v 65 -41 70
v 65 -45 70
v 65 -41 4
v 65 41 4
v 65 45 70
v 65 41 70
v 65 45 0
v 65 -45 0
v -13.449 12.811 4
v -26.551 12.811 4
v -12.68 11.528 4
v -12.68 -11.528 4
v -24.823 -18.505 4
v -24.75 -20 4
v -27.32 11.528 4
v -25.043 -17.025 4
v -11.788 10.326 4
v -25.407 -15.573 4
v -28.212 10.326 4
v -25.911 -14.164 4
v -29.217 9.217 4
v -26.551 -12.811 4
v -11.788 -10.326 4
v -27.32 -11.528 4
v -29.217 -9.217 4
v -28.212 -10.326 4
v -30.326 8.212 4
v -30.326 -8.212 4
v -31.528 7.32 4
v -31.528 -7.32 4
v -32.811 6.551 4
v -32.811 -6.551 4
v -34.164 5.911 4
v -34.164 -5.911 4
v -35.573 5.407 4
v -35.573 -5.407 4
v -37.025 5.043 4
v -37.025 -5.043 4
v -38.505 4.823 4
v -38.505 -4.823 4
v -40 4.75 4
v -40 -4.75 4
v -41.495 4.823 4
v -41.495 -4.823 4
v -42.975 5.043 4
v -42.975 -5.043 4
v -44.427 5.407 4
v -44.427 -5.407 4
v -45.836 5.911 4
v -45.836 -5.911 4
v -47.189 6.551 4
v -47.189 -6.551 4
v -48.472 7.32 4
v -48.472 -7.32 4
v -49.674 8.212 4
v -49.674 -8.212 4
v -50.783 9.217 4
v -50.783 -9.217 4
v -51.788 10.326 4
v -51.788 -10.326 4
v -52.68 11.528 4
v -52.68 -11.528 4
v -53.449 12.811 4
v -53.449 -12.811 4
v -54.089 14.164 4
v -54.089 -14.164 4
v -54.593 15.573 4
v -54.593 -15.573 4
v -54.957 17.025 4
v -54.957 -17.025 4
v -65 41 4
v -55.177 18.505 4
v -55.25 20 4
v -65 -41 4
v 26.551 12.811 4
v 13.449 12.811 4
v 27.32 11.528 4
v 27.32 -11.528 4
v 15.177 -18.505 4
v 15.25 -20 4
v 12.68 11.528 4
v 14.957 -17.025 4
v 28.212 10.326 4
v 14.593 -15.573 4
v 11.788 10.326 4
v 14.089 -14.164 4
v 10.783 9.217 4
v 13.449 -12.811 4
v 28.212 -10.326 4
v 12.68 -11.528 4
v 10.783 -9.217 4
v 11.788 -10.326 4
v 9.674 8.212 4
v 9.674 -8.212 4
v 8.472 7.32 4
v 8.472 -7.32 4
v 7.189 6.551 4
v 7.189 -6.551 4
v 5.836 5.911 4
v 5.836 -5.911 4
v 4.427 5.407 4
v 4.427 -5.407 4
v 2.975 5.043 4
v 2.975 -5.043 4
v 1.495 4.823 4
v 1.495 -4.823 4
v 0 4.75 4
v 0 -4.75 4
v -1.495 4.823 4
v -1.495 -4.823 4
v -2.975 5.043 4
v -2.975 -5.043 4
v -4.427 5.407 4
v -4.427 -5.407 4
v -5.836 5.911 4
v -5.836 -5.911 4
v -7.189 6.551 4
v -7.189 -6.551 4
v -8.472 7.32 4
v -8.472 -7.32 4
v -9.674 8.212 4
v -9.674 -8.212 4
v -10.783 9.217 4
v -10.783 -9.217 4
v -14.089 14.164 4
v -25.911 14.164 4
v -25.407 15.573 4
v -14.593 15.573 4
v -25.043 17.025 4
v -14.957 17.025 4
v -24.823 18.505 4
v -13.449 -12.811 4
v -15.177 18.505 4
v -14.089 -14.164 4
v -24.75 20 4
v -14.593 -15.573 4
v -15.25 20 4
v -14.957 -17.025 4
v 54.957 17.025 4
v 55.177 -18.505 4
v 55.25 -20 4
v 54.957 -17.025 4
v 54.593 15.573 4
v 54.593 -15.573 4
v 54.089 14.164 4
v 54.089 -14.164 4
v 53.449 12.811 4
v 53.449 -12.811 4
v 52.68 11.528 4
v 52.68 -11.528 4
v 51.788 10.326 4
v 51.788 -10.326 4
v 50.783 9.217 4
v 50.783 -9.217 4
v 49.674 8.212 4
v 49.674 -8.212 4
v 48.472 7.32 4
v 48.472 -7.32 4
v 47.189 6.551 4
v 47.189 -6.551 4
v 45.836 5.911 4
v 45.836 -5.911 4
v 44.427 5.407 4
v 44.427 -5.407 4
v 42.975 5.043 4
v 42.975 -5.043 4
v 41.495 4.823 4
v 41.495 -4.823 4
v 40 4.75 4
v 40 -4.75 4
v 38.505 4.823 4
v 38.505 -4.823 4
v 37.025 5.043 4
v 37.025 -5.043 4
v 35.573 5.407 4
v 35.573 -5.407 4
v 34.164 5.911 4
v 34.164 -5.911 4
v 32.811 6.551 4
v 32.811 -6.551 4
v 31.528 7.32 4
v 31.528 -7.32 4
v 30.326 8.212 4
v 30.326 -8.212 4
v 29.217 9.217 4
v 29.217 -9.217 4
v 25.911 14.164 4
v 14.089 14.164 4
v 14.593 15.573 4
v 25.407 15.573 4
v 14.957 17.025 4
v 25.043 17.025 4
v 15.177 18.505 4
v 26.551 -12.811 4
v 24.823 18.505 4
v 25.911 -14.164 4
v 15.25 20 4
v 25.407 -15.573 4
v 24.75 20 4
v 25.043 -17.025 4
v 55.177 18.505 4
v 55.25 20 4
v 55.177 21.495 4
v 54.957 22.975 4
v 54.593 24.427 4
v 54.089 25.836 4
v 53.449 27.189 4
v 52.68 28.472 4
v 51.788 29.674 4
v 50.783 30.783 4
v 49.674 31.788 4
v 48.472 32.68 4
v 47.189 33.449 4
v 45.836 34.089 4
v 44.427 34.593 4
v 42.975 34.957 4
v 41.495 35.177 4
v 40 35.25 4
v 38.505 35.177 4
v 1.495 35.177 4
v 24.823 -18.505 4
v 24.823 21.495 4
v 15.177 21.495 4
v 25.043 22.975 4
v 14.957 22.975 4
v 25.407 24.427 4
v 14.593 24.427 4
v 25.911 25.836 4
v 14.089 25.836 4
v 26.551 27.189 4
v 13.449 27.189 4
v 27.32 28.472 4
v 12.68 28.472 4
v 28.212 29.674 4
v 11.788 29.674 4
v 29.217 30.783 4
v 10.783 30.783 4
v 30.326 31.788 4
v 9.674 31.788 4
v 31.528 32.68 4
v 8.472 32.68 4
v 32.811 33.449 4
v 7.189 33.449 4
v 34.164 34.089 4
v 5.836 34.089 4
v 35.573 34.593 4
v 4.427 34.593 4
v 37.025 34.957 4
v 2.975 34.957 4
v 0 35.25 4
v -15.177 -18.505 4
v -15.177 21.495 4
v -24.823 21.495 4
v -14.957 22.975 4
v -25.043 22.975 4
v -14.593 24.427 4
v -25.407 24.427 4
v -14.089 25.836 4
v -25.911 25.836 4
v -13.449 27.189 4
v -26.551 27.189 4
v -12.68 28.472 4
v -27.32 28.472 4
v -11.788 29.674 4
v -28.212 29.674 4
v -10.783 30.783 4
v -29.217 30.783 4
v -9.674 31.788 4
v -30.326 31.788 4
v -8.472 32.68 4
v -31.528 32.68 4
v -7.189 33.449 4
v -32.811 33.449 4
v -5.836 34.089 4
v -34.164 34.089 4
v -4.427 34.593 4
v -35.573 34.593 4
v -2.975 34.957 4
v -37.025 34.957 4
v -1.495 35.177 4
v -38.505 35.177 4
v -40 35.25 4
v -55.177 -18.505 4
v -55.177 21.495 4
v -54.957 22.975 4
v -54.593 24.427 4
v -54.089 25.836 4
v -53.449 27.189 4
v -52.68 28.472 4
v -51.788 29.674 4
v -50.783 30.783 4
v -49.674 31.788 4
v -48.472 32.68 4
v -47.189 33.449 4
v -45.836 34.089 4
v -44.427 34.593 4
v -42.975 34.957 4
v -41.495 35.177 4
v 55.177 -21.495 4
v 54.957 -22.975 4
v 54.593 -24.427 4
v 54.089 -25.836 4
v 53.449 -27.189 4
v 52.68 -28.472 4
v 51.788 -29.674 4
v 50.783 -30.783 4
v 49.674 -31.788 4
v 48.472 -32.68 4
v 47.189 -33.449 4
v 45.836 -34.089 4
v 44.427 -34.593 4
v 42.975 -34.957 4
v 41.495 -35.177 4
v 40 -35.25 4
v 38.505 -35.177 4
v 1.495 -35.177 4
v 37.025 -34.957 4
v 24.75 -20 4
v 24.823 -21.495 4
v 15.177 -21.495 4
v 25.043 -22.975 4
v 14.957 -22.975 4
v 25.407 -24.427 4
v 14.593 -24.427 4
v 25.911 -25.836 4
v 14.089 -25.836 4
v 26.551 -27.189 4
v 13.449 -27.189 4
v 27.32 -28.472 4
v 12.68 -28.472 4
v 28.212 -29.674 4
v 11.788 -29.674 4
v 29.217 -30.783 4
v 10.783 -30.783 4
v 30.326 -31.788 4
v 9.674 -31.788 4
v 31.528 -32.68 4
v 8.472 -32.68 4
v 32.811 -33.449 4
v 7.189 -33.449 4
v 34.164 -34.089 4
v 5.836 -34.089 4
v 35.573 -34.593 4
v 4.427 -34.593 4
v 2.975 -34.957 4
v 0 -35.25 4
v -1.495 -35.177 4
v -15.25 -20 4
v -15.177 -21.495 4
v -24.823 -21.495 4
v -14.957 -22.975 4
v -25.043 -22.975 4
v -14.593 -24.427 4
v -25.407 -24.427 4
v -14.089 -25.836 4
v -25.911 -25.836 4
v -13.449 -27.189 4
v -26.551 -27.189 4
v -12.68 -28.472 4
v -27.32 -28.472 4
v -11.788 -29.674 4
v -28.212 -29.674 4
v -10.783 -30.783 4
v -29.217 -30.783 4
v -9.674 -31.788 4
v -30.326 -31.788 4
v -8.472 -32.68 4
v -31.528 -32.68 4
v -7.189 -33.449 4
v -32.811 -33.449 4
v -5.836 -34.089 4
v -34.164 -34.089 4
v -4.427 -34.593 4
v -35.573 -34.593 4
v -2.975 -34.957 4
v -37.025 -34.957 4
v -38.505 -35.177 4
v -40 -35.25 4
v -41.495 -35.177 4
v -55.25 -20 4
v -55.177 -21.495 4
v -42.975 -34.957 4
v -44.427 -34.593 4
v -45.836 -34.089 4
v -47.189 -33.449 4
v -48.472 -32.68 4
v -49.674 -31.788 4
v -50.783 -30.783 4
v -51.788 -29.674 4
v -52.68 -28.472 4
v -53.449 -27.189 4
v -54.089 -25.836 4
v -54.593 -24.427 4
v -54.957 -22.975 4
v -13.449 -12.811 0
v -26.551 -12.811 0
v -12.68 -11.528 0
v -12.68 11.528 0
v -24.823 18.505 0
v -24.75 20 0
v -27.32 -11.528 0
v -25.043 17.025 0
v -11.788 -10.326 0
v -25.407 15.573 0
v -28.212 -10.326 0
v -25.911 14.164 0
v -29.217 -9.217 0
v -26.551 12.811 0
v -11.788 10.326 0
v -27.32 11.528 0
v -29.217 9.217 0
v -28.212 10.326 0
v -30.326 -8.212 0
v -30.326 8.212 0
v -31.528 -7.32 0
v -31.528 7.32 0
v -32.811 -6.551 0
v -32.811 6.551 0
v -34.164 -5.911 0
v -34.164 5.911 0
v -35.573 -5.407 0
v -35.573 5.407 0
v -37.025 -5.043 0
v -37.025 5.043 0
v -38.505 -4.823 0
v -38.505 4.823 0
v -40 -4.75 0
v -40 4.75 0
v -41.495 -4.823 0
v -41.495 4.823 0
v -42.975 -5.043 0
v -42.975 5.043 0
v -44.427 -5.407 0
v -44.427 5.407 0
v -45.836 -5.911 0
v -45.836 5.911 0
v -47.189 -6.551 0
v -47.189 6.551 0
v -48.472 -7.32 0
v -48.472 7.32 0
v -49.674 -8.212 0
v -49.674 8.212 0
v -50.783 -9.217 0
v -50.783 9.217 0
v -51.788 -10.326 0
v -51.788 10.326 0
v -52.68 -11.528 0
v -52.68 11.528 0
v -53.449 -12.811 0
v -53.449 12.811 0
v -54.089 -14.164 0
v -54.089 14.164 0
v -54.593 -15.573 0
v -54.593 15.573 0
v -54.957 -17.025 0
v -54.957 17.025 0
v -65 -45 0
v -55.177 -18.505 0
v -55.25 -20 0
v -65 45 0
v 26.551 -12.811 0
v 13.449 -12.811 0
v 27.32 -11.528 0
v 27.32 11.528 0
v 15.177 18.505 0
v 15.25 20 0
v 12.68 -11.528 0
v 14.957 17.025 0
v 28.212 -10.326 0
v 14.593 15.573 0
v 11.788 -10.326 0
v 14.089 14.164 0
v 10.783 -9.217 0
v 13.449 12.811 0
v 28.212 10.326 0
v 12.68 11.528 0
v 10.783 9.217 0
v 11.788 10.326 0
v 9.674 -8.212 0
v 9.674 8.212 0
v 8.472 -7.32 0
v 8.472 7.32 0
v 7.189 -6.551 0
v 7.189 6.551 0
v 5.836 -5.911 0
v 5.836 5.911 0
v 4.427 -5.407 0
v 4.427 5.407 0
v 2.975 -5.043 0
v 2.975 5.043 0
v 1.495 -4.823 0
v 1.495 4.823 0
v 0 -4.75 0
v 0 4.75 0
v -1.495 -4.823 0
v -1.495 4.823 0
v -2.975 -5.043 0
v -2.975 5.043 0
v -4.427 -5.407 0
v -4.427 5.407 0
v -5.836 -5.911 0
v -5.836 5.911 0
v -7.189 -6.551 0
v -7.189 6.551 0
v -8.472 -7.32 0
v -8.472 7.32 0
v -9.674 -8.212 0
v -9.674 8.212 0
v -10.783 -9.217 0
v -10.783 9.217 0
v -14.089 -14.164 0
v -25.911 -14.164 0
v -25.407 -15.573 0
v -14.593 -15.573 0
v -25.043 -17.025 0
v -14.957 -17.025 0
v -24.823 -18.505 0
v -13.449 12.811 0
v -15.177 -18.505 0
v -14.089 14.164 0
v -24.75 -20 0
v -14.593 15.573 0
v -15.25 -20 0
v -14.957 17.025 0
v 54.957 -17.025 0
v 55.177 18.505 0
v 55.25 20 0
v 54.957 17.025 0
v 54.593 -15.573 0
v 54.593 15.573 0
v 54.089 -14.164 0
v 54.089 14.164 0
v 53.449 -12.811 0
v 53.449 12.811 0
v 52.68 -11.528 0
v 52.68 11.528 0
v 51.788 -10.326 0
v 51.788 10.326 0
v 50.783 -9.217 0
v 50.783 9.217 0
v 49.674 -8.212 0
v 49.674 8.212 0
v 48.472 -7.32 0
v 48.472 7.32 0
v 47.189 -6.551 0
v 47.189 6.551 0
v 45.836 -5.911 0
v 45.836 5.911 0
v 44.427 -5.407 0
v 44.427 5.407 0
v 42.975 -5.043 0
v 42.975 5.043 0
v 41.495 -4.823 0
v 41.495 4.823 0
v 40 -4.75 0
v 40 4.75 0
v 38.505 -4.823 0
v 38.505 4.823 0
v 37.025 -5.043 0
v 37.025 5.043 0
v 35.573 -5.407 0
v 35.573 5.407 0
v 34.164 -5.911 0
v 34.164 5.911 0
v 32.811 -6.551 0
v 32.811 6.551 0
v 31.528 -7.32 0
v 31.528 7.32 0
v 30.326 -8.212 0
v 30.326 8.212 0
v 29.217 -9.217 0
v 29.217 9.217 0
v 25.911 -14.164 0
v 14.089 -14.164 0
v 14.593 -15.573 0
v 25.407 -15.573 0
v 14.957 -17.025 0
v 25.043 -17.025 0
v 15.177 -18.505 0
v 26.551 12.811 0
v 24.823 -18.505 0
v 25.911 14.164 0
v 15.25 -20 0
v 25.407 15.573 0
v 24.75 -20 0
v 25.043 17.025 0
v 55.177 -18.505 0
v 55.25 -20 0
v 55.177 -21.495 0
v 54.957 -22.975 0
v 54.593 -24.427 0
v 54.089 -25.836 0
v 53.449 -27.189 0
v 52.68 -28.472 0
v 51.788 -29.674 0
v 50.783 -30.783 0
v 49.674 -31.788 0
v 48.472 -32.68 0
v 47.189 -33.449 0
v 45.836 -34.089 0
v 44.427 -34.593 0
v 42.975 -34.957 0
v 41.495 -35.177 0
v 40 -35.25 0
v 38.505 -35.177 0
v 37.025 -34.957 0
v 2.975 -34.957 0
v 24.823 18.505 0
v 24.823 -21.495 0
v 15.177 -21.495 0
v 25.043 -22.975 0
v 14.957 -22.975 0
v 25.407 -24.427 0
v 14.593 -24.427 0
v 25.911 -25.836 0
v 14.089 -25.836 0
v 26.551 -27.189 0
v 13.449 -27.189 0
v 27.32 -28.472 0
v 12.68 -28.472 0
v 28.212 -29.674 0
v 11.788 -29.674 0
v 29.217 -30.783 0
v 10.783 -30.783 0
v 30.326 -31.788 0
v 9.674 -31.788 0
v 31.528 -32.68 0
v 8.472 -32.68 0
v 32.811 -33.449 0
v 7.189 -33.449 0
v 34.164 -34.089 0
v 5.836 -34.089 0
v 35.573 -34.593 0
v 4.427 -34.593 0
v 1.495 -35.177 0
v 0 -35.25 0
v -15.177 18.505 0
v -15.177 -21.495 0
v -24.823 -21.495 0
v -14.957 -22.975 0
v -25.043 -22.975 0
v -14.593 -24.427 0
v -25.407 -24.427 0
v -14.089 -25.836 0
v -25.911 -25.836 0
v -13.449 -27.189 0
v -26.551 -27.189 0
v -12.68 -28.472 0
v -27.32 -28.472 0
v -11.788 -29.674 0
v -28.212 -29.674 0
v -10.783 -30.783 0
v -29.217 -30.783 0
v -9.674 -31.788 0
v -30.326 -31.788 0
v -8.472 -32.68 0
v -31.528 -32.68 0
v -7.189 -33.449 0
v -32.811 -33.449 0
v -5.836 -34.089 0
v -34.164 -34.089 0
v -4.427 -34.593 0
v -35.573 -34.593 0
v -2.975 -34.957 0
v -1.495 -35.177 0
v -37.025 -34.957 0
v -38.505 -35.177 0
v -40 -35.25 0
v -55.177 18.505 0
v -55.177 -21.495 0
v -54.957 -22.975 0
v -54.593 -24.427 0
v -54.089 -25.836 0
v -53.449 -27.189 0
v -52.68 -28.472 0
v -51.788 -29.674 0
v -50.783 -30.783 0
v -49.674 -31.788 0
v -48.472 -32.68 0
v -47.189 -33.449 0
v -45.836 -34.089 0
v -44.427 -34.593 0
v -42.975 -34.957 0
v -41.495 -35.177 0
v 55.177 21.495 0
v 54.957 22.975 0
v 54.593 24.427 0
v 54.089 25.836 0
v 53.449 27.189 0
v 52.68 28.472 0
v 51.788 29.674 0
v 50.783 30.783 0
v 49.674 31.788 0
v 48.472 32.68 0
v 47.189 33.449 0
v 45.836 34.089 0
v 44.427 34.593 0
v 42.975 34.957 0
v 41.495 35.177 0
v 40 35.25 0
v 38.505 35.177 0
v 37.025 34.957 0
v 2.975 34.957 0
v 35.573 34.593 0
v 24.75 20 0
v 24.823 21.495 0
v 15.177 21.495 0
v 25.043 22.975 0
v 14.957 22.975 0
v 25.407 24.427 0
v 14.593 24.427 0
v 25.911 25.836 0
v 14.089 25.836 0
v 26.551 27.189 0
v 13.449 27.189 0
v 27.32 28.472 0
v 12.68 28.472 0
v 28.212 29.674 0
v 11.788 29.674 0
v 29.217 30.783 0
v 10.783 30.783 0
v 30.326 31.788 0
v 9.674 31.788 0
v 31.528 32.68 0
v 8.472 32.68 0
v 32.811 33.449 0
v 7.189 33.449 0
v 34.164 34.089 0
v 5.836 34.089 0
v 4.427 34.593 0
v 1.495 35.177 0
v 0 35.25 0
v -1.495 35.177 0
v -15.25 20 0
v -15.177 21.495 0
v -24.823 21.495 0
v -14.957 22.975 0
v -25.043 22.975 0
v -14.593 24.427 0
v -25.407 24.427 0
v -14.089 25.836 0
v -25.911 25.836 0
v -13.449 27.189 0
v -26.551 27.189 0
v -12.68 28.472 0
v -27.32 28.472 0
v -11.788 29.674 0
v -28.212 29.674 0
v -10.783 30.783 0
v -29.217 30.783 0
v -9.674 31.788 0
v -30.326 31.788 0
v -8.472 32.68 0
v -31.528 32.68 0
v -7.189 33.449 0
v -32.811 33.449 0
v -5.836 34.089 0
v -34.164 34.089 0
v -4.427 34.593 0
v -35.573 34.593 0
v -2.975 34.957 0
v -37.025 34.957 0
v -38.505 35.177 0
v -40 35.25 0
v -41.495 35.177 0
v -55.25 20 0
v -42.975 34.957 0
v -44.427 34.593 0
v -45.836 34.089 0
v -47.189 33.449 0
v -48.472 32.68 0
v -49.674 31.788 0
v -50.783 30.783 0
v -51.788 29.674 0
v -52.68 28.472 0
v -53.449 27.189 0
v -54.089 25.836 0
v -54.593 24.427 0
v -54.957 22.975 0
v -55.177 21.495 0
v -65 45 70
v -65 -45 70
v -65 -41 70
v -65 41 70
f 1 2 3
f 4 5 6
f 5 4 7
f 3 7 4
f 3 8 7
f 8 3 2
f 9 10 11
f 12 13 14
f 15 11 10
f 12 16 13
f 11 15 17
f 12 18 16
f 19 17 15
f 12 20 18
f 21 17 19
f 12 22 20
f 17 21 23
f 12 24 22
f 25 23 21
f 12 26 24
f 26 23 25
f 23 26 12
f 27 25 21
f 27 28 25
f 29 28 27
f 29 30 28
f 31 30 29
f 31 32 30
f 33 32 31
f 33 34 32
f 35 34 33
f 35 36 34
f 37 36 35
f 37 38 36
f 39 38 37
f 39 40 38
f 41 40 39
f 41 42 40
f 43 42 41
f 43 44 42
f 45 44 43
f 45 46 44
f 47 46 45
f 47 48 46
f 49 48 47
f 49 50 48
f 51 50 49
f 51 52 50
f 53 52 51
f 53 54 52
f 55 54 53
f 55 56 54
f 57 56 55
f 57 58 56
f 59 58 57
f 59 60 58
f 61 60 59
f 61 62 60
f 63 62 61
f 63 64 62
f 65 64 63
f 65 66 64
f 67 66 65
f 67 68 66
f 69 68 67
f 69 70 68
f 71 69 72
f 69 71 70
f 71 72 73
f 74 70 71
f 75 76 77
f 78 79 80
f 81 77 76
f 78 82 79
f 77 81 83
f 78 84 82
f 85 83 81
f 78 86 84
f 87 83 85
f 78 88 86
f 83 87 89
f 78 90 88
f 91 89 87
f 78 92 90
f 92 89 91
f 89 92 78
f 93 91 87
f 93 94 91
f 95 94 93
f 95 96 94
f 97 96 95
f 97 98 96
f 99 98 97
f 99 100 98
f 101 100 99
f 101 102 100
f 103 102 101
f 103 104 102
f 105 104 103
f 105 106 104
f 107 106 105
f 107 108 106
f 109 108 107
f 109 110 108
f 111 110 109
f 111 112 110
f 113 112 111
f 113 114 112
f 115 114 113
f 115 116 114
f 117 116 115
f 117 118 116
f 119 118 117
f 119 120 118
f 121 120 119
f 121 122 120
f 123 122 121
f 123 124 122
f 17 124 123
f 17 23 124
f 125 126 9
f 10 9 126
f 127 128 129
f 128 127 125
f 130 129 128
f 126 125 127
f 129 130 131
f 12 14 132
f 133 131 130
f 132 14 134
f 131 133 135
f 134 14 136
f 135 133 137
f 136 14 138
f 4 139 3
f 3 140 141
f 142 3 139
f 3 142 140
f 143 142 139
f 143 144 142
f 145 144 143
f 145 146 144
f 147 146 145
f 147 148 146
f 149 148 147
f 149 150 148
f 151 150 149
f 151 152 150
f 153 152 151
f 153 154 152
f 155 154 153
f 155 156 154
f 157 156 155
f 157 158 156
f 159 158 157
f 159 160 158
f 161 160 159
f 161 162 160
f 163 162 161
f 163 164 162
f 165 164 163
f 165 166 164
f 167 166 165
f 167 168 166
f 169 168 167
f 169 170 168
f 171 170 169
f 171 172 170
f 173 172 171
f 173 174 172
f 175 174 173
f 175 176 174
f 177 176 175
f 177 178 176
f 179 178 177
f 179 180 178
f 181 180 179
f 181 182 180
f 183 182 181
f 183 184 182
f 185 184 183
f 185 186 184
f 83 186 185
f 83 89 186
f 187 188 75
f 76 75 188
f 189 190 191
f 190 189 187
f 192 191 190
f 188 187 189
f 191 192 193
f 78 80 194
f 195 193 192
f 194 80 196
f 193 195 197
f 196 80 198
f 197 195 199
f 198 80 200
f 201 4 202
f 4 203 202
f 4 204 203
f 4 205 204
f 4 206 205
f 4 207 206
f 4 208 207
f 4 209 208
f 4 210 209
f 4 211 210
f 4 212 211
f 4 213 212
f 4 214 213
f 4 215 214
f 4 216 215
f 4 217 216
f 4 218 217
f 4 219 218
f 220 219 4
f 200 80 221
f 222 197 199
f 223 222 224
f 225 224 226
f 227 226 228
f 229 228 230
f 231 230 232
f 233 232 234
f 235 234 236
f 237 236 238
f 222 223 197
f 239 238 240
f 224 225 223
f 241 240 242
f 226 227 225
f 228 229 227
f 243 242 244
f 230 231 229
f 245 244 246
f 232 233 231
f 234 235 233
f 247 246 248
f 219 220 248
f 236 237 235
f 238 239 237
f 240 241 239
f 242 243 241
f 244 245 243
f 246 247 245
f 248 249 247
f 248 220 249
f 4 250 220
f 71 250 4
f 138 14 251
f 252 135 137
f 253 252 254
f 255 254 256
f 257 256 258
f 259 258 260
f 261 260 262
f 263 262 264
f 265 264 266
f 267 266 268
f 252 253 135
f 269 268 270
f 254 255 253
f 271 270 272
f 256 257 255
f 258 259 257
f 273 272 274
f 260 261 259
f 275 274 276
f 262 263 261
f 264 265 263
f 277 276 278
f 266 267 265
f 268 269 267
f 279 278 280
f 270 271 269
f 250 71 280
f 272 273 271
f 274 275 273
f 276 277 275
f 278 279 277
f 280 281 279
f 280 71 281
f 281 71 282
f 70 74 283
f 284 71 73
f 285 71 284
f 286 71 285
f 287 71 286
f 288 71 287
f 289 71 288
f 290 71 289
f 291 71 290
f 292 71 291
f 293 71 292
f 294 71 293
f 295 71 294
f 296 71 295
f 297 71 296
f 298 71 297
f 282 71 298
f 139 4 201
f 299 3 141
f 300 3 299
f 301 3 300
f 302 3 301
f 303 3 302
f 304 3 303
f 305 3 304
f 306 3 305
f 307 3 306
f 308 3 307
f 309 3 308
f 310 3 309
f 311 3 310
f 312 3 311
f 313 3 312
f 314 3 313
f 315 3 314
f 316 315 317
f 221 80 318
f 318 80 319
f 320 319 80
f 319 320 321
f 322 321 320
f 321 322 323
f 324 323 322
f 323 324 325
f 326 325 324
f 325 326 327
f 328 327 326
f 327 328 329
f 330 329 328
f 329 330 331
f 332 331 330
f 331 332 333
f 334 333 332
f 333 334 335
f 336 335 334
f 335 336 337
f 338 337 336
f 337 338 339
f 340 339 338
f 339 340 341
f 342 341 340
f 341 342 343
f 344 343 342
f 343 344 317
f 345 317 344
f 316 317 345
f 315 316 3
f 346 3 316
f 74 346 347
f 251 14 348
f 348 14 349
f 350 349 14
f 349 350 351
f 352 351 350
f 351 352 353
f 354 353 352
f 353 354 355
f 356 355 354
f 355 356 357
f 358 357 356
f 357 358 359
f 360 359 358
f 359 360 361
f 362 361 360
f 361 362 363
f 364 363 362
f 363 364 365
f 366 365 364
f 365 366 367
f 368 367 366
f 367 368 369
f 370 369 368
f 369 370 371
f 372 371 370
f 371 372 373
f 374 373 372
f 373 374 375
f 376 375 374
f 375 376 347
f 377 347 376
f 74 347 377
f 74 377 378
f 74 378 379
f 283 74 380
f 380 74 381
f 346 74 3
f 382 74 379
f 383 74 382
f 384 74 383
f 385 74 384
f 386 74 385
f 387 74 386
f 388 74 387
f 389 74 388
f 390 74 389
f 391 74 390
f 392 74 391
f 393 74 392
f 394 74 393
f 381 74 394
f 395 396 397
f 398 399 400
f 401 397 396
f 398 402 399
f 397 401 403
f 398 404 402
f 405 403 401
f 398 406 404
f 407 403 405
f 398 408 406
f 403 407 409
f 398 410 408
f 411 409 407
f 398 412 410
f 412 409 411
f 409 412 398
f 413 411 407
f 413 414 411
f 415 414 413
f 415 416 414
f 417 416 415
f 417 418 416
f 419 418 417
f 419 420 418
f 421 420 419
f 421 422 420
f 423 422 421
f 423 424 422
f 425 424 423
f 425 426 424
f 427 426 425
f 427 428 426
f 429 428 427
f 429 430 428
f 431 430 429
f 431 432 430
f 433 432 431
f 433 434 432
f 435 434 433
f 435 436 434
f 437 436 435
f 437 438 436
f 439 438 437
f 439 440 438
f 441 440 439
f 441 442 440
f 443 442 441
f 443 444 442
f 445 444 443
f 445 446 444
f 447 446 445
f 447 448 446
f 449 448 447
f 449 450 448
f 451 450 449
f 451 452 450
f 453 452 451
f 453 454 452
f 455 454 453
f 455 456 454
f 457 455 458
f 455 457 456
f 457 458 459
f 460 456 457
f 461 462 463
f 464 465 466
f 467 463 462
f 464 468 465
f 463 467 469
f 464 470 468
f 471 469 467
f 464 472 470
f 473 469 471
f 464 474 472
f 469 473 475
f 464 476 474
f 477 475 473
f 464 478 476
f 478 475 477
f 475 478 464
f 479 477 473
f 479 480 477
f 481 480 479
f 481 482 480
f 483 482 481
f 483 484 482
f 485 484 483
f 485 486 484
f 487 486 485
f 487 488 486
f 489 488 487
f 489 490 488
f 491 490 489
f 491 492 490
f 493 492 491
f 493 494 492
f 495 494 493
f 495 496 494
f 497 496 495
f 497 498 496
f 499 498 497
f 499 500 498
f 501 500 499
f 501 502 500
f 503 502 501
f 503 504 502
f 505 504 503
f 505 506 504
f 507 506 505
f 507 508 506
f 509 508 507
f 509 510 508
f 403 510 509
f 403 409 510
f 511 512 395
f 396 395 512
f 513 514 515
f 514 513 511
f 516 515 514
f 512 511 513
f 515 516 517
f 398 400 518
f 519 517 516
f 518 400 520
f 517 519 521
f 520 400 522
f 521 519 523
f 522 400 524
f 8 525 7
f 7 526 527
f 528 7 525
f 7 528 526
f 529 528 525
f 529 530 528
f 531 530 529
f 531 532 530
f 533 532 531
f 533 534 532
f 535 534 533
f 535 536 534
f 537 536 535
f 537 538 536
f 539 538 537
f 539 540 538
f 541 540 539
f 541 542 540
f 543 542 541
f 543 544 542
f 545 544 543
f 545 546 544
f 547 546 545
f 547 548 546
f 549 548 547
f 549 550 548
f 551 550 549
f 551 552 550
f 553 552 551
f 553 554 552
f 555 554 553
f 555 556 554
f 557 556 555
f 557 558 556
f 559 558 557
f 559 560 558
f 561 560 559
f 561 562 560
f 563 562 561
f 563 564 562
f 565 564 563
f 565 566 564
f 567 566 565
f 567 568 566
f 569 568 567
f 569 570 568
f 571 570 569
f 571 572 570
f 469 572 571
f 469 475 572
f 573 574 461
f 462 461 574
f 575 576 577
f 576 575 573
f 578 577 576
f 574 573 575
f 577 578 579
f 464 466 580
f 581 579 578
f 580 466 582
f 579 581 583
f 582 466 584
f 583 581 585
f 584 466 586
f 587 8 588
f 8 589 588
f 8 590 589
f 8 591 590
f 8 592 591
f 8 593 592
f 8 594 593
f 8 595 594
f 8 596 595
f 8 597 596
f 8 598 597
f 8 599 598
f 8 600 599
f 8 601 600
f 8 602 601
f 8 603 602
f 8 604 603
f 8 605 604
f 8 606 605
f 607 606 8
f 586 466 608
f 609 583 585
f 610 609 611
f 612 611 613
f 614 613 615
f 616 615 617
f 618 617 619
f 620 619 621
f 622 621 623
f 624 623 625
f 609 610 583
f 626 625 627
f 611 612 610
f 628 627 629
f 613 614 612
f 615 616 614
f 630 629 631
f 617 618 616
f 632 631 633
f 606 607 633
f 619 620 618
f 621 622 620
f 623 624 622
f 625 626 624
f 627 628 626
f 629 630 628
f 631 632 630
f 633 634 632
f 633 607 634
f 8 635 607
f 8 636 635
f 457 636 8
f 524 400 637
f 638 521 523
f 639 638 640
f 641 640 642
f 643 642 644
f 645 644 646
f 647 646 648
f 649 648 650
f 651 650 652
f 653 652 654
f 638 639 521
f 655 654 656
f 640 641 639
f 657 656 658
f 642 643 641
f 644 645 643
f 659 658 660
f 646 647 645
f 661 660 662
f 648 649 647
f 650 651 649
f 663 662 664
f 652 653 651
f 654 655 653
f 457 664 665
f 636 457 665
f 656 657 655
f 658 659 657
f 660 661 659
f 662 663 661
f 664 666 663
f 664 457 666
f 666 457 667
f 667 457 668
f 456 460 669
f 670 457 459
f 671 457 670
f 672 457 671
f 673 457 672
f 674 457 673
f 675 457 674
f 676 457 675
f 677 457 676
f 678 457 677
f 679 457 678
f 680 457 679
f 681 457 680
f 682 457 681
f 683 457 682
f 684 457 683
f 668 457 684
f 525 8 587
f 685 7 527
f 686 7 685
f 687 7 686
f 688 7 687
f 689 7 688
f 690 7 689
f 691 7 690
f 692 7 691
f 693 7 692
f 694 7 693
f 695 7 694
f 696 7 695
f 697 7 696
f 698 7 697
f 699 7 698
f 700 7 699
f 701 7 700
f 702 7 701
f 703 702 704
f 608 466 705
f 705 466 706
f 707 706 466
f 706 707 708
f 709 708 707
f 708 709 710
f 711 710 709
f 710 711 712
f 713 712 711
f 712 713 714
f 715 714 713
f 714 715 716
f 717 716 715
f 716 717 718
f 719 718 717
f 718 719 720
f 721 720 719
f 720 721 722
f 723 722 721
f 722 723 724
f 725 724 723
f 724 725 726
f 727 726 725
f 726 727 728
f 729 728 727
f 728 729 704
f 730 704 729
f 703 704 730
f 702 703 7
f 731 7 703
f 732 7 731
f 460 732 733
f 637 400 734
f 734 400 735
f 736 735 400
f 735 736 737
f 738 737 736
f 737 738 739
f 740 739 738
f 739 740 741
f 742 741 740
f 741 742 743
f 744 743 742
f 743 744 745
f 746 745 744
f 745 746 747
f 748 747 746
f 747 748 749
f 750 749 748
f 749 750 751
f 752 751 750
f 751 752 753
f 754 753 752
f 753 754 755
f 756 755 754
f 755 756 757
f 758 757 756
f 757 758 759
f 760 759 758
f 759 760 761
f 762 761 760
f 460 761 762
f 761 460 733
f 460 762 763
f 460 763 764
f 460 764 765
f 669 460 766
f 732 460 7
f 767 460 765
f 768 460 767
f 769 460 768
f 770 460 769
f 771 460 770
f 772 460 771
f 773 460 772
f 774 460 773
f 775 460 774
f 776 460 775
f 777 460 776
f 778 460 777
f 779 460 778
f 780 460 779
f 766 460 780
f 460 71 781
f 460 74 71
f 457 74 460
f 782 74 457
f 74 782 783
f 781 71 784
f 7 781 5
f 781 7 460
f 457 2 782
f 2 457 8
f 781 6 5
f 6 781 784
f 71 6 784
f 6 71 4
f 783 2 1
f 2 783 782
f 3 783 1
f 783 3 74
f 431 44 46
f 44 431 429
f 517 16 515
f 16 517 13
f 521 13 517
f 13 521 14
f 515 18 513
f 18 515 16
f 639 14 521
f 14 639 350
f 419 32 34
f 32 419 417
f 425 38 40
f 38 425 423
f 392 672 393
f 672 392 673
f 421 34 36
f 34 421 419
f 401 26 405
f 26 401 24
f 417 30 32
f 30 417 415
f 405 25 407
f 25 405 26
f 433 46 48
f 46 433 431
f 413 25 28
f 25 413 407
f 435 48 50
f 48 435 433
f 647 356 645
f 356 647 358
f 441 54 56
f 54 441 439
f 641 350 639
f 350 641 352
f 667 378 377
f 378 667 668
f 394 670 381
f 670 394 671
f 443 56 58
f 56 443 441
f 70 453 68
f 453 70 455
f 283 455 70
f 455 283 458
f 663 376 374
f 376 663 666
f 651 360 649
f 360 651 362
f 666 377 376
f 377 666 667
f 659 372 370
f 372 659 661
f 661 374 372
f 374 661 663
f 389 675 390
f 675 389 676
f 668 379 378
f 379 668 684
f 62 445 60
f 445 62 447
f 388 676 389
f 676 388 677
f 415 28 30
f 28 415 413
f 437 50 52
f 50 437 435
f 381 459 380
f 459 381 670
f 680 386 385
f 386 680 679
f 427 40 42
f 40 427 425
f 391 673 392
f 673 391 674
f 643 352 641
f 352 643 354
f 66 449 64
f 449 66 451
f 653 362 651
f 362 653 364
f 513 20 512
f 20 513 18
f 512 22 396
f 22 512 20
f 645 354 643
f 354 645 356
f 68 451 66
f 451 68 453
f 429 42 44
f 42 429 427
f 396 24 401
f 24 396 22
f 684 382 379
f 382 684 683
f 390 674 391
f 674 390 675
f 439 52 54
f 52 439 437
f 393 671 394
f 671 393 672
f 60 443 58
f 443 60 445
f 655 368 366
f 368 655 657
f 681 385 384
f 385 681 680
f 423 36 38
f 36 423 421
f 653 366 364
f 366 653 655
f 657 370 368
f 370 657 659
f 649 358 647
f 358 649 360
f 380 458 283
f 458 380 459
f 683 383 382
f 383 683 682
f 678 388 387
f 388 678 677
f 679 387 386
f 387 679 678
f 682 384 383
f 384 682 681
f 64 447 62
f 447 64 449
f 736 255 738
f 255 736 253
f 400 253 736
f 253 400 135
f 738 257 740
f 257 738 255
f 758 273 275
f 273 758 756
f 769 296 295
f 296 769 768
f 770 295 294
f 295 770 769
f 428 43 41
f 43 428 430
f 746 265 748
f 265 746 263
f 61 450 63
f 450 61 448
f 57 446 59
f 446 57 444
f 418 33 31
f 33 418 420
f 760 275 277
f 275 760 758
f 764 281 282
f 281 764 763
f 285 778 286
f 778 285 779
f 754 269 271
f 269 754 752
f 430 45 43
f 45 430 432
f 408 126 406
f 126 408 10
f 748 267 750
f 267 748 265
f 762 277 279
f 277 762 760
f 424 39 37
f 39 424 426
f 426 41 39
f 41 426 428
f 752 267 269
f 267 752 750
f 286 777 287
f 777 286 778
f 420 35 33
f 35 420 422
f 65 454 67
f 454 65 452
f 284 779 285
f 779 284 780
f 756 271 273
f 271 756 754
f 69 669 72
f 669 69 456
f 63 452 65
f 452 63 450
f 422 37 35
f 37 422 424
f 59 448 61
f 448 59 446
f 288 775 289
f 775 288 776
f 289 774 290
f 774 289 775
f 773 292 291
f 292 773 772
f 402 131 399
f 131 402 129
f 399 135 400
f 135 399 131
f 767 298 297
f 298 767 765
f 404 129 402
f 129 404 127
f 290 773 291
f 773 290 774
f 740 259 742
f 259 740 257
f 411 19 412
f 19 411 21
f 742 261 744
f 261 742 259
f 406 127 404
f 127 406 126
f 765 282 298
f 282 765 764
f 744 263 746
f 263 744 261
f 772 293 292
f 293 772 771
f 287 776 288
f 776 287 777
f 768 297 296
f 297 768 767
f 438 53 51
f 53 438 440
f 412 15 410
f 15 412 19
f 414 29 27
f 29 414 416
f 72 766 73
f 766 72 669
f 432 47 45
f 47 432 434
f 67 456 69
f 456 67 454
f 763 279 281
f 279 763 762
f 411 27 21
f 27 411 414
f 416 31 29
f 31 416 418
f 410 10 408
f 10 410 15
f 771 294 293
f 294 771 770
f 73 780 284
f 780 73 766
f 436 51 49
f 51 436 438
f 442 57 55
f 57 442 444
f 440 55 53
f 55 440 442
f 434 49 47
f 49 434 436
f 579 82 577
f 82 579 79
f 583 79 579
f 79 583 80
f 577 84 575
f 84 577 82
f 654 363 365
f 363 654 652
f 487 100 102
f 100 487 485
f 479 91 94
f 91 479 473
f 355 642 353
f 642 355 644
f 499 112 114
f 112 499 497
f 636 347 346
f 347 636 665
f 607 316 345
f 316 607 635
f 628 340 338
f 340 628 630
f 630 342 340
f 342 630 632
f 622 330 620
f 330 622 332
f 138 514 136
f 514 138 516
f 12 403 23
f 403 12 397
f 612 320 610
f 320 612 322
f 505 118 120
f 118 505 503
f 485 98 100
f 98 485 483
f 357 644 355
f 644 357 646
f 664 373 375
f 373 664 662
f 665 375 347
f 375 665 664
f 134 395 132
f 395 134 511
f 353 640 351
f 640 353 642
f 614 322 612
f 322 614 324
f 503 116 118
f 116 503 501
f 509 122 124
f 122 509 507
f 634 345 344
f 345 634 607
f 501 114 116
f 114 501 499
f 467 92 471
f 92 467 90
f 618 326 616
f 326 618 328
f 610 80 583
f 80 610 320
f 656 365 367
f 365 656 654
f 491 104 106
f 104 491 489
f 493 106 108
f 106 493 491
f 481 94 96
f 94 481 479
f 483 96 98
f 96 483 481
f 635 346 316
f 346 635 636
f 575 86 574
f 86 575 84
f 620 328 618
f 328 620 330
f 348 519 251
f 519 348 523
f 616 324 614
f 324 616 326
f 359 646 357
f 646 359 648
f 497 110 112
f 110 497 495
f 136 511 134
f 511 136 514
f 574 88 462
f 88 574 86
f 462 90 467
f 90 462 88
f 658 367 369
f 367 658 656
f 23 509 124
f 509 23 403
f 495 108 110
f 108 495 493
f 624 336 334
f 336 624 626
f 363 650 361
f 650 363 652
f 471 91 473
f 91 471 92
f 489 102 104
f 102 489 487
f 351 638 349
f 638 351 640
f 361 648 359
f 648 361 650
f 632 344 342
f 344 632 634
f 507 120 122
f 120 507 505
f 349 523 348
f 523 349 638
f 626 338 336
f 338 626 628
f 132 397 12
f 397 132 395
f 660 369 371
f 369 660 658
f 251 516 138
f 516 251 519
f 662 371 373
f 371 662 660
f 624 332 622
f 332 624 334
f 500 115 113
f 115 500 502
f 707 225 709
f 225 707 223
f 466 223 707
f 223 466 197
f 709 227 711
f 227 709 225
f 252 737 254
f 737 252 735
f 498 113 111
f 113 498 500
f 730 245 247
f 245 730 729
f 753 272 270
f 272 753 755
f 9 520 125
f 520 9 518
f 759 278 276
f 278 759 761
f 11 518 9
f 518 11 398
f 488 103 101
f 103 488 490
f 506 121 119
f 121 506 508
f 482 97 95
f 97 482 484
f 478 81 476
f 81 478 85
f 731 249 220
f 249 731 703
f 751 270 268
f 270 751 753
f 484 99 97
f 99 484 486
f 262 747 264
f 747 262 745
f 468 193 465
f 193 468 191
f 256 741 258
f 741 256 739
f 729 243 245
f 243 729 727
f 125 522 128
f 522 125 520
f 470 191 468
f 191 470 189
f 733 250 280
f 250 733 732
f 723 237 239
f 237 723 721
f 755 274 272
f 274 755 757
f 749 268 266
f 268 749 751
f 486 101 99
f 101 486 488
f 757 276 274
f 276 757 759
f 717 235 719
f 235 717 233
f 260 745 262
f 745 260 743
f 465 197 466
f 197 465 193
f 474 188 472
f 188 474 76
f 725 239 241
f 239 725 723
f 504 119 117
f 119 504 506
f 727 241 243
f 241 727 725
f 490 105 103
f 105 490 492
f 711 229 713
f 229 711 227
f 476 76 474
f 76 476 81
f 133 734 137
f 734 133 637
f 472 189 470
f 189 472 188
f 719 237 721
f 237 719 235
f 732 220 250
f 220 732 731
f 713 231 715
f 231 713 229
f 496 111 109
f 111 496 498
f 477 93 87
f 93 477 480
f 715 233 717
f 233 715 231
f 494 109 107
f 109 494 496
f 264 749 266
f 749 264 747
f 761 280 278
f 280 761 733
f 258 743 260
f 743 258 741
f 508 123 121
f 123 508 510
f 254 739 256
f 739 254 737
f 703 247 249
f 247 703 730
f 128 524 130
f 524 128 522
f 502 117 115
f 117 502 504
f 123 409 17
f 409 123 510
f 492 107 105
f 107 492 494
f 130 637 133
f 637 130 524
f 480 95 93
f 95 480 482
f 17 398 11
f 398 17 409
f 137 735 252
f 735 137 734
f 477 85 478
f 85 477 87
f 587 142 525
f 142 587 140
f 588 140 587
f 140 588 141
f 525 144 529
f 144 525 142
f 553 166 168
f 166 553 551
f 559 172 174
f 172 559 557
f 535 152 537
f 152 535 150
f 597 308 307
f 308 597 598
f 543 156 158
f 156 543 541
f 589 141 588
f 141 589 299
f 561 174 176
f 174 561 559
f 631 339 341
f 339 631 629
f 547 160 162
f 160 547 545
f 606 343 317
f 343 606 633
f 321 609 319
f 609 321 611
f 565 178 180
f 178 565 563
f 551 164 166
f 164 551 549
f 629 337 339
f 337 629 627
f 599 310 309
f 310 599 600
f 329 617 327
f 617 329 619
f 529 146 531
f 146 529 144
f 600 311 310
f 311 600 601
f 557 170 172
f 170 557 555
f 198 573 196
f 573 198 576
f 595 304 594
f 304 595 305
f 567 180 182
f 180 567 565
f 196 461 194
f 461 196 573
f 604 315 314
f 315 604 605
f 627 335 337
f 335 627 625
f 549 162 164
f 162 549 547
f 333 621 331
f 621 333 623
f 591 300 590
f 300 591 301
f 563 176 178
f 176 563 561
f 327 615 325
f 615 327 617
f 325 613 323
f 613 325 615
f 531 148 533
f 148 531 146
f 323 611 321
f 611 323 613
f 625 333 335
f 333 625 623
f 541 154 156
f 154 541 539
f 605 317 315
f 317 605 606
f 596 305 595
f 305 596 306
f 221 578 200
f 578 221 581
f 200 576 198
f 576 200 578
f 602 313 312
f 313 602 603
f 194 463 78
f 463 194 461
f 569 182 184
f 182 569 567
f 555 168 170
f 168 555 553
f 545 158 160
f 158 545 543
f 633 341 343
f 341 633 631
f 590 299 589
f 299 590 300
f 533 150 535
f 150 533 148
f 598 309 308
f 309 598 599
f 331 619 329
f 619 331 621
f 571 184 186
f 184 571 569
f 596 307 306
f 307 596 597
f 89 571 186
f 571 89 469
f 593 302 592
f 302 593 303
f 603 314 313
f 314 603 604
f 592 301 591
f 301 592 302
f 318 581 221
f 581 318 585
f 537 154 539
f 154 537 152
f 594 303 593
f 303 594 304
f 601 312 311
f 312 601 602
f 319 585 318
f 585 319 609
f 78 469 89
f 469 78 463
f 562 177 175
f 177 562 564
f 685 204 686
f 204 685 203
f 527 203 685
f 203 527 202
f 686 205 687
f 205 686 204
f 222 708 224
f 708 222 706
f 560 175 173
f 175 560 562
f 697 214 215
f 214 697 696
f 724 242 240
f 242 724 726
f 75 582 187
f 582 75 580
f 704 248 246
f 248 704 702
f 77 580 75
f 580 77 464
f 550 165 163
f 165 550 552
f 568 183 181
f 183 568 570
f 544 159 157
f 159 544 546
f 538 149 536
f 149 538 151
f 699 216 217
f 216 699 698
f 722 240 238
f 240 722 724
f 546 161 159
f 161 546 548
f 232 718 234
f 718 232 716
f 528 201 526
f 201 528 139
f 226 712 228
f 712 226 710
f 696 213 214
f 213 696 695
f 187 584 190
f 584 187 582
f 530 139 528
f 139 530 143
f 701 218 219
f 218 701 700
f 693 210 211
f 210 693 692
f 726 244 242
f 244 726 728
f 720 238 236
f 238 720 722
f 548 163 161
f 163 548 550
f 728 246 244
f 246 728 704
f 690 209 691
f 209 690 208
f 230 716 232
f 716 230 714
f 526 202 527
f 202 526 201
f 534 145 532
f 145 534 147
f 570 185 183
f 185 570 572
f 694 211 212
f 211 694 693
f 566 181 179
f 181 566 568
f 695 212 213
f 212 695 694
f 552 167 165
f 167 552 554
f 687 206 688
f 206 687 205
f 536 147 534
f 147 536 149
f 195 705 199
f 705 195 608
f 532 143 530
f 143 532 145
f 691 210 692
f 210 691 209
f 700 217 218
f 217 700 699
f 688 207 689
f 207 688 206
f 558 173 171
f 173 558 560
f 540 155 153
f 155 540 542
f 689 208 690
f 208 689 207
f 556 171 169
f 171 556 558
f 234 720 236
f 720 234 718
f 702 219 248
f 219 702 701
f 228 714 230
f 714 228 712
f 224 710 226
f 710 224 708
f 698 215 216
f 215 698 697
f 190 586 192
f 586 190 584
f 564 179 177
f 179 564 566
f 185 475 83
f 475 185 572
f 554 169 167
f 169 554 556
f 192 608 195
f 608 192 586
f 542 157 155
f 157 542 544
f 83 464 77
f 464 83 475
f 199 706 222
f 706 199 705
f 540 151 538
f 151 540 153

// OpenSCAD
// Rack for six 50 mL conical (Falcon-type) tubes
// Print orientation: flat plate on bed (z=0), walls rise up. Flipped after print.

// Plate dimensions
plate_x = 130;
plate_y = 90;
plate_z = 4;

// Hole parameters
hole_diameter = 30.5;
hole_radius = hole_diameter / 2;
hole_spacing_x = 40;
hole_spacing_y = 40;
num_rows = 2; // along Y
num_cols = 3; // along X

// Wall parameters
wall_length_x = 130;
wall_thickness_y = 4;
wall_height = 70;

// Ensure round holes
$fn = 64;

// Calculate hole positions (centred on plate)
// X positions: centred, spacing 40mm
x_positions = [
    -hole_spacing_x,
    0,
    hole_spacing_x
];

// Y positions: centred, spacing 40mm
y_positions = [
    -hole_spacing_y / 2,
    hole_spacing_y / 2
];

// Build the rack as a single solid
// Plate extends from -plate_x/2 to plate_x/2 in X, -plate_y/2 to plate_y/2 in Y
// Walls are flush with plate edges
difference() {
    union() {
        // Flat plate (centred on origin)
        translate([-plate_x/2, -plate_y/2, 0])
            cube([plate_x, plate_y, plate_z], center = false);
        
        // Two walls along long edges (X-direction), flush with plate edges
        // Front wall (positive Y edge)
        translate([-wall_length_x/2, plate_y/2 - wall_thickness_y, 0])
            cube([wall_length_x, wall_thickness_y, wall_height], center = false);
        
        // Back wall (negative Y edge)
        translate([-wall_length_x/2, -plate_y/2, 0])
            cube([wall_length_x, wall_thickness_y, wall_height], center = false);
    }
    
    // Cut through-holes for tubes (extend slightly past plate faces)
    for (x = x_positions) {
        for (y = y_positions) {
            translate([x, y, -0.01])
                cylinder(r = hole_radius, h = plate_z + 0.02, center = false);
        }
    }
}
